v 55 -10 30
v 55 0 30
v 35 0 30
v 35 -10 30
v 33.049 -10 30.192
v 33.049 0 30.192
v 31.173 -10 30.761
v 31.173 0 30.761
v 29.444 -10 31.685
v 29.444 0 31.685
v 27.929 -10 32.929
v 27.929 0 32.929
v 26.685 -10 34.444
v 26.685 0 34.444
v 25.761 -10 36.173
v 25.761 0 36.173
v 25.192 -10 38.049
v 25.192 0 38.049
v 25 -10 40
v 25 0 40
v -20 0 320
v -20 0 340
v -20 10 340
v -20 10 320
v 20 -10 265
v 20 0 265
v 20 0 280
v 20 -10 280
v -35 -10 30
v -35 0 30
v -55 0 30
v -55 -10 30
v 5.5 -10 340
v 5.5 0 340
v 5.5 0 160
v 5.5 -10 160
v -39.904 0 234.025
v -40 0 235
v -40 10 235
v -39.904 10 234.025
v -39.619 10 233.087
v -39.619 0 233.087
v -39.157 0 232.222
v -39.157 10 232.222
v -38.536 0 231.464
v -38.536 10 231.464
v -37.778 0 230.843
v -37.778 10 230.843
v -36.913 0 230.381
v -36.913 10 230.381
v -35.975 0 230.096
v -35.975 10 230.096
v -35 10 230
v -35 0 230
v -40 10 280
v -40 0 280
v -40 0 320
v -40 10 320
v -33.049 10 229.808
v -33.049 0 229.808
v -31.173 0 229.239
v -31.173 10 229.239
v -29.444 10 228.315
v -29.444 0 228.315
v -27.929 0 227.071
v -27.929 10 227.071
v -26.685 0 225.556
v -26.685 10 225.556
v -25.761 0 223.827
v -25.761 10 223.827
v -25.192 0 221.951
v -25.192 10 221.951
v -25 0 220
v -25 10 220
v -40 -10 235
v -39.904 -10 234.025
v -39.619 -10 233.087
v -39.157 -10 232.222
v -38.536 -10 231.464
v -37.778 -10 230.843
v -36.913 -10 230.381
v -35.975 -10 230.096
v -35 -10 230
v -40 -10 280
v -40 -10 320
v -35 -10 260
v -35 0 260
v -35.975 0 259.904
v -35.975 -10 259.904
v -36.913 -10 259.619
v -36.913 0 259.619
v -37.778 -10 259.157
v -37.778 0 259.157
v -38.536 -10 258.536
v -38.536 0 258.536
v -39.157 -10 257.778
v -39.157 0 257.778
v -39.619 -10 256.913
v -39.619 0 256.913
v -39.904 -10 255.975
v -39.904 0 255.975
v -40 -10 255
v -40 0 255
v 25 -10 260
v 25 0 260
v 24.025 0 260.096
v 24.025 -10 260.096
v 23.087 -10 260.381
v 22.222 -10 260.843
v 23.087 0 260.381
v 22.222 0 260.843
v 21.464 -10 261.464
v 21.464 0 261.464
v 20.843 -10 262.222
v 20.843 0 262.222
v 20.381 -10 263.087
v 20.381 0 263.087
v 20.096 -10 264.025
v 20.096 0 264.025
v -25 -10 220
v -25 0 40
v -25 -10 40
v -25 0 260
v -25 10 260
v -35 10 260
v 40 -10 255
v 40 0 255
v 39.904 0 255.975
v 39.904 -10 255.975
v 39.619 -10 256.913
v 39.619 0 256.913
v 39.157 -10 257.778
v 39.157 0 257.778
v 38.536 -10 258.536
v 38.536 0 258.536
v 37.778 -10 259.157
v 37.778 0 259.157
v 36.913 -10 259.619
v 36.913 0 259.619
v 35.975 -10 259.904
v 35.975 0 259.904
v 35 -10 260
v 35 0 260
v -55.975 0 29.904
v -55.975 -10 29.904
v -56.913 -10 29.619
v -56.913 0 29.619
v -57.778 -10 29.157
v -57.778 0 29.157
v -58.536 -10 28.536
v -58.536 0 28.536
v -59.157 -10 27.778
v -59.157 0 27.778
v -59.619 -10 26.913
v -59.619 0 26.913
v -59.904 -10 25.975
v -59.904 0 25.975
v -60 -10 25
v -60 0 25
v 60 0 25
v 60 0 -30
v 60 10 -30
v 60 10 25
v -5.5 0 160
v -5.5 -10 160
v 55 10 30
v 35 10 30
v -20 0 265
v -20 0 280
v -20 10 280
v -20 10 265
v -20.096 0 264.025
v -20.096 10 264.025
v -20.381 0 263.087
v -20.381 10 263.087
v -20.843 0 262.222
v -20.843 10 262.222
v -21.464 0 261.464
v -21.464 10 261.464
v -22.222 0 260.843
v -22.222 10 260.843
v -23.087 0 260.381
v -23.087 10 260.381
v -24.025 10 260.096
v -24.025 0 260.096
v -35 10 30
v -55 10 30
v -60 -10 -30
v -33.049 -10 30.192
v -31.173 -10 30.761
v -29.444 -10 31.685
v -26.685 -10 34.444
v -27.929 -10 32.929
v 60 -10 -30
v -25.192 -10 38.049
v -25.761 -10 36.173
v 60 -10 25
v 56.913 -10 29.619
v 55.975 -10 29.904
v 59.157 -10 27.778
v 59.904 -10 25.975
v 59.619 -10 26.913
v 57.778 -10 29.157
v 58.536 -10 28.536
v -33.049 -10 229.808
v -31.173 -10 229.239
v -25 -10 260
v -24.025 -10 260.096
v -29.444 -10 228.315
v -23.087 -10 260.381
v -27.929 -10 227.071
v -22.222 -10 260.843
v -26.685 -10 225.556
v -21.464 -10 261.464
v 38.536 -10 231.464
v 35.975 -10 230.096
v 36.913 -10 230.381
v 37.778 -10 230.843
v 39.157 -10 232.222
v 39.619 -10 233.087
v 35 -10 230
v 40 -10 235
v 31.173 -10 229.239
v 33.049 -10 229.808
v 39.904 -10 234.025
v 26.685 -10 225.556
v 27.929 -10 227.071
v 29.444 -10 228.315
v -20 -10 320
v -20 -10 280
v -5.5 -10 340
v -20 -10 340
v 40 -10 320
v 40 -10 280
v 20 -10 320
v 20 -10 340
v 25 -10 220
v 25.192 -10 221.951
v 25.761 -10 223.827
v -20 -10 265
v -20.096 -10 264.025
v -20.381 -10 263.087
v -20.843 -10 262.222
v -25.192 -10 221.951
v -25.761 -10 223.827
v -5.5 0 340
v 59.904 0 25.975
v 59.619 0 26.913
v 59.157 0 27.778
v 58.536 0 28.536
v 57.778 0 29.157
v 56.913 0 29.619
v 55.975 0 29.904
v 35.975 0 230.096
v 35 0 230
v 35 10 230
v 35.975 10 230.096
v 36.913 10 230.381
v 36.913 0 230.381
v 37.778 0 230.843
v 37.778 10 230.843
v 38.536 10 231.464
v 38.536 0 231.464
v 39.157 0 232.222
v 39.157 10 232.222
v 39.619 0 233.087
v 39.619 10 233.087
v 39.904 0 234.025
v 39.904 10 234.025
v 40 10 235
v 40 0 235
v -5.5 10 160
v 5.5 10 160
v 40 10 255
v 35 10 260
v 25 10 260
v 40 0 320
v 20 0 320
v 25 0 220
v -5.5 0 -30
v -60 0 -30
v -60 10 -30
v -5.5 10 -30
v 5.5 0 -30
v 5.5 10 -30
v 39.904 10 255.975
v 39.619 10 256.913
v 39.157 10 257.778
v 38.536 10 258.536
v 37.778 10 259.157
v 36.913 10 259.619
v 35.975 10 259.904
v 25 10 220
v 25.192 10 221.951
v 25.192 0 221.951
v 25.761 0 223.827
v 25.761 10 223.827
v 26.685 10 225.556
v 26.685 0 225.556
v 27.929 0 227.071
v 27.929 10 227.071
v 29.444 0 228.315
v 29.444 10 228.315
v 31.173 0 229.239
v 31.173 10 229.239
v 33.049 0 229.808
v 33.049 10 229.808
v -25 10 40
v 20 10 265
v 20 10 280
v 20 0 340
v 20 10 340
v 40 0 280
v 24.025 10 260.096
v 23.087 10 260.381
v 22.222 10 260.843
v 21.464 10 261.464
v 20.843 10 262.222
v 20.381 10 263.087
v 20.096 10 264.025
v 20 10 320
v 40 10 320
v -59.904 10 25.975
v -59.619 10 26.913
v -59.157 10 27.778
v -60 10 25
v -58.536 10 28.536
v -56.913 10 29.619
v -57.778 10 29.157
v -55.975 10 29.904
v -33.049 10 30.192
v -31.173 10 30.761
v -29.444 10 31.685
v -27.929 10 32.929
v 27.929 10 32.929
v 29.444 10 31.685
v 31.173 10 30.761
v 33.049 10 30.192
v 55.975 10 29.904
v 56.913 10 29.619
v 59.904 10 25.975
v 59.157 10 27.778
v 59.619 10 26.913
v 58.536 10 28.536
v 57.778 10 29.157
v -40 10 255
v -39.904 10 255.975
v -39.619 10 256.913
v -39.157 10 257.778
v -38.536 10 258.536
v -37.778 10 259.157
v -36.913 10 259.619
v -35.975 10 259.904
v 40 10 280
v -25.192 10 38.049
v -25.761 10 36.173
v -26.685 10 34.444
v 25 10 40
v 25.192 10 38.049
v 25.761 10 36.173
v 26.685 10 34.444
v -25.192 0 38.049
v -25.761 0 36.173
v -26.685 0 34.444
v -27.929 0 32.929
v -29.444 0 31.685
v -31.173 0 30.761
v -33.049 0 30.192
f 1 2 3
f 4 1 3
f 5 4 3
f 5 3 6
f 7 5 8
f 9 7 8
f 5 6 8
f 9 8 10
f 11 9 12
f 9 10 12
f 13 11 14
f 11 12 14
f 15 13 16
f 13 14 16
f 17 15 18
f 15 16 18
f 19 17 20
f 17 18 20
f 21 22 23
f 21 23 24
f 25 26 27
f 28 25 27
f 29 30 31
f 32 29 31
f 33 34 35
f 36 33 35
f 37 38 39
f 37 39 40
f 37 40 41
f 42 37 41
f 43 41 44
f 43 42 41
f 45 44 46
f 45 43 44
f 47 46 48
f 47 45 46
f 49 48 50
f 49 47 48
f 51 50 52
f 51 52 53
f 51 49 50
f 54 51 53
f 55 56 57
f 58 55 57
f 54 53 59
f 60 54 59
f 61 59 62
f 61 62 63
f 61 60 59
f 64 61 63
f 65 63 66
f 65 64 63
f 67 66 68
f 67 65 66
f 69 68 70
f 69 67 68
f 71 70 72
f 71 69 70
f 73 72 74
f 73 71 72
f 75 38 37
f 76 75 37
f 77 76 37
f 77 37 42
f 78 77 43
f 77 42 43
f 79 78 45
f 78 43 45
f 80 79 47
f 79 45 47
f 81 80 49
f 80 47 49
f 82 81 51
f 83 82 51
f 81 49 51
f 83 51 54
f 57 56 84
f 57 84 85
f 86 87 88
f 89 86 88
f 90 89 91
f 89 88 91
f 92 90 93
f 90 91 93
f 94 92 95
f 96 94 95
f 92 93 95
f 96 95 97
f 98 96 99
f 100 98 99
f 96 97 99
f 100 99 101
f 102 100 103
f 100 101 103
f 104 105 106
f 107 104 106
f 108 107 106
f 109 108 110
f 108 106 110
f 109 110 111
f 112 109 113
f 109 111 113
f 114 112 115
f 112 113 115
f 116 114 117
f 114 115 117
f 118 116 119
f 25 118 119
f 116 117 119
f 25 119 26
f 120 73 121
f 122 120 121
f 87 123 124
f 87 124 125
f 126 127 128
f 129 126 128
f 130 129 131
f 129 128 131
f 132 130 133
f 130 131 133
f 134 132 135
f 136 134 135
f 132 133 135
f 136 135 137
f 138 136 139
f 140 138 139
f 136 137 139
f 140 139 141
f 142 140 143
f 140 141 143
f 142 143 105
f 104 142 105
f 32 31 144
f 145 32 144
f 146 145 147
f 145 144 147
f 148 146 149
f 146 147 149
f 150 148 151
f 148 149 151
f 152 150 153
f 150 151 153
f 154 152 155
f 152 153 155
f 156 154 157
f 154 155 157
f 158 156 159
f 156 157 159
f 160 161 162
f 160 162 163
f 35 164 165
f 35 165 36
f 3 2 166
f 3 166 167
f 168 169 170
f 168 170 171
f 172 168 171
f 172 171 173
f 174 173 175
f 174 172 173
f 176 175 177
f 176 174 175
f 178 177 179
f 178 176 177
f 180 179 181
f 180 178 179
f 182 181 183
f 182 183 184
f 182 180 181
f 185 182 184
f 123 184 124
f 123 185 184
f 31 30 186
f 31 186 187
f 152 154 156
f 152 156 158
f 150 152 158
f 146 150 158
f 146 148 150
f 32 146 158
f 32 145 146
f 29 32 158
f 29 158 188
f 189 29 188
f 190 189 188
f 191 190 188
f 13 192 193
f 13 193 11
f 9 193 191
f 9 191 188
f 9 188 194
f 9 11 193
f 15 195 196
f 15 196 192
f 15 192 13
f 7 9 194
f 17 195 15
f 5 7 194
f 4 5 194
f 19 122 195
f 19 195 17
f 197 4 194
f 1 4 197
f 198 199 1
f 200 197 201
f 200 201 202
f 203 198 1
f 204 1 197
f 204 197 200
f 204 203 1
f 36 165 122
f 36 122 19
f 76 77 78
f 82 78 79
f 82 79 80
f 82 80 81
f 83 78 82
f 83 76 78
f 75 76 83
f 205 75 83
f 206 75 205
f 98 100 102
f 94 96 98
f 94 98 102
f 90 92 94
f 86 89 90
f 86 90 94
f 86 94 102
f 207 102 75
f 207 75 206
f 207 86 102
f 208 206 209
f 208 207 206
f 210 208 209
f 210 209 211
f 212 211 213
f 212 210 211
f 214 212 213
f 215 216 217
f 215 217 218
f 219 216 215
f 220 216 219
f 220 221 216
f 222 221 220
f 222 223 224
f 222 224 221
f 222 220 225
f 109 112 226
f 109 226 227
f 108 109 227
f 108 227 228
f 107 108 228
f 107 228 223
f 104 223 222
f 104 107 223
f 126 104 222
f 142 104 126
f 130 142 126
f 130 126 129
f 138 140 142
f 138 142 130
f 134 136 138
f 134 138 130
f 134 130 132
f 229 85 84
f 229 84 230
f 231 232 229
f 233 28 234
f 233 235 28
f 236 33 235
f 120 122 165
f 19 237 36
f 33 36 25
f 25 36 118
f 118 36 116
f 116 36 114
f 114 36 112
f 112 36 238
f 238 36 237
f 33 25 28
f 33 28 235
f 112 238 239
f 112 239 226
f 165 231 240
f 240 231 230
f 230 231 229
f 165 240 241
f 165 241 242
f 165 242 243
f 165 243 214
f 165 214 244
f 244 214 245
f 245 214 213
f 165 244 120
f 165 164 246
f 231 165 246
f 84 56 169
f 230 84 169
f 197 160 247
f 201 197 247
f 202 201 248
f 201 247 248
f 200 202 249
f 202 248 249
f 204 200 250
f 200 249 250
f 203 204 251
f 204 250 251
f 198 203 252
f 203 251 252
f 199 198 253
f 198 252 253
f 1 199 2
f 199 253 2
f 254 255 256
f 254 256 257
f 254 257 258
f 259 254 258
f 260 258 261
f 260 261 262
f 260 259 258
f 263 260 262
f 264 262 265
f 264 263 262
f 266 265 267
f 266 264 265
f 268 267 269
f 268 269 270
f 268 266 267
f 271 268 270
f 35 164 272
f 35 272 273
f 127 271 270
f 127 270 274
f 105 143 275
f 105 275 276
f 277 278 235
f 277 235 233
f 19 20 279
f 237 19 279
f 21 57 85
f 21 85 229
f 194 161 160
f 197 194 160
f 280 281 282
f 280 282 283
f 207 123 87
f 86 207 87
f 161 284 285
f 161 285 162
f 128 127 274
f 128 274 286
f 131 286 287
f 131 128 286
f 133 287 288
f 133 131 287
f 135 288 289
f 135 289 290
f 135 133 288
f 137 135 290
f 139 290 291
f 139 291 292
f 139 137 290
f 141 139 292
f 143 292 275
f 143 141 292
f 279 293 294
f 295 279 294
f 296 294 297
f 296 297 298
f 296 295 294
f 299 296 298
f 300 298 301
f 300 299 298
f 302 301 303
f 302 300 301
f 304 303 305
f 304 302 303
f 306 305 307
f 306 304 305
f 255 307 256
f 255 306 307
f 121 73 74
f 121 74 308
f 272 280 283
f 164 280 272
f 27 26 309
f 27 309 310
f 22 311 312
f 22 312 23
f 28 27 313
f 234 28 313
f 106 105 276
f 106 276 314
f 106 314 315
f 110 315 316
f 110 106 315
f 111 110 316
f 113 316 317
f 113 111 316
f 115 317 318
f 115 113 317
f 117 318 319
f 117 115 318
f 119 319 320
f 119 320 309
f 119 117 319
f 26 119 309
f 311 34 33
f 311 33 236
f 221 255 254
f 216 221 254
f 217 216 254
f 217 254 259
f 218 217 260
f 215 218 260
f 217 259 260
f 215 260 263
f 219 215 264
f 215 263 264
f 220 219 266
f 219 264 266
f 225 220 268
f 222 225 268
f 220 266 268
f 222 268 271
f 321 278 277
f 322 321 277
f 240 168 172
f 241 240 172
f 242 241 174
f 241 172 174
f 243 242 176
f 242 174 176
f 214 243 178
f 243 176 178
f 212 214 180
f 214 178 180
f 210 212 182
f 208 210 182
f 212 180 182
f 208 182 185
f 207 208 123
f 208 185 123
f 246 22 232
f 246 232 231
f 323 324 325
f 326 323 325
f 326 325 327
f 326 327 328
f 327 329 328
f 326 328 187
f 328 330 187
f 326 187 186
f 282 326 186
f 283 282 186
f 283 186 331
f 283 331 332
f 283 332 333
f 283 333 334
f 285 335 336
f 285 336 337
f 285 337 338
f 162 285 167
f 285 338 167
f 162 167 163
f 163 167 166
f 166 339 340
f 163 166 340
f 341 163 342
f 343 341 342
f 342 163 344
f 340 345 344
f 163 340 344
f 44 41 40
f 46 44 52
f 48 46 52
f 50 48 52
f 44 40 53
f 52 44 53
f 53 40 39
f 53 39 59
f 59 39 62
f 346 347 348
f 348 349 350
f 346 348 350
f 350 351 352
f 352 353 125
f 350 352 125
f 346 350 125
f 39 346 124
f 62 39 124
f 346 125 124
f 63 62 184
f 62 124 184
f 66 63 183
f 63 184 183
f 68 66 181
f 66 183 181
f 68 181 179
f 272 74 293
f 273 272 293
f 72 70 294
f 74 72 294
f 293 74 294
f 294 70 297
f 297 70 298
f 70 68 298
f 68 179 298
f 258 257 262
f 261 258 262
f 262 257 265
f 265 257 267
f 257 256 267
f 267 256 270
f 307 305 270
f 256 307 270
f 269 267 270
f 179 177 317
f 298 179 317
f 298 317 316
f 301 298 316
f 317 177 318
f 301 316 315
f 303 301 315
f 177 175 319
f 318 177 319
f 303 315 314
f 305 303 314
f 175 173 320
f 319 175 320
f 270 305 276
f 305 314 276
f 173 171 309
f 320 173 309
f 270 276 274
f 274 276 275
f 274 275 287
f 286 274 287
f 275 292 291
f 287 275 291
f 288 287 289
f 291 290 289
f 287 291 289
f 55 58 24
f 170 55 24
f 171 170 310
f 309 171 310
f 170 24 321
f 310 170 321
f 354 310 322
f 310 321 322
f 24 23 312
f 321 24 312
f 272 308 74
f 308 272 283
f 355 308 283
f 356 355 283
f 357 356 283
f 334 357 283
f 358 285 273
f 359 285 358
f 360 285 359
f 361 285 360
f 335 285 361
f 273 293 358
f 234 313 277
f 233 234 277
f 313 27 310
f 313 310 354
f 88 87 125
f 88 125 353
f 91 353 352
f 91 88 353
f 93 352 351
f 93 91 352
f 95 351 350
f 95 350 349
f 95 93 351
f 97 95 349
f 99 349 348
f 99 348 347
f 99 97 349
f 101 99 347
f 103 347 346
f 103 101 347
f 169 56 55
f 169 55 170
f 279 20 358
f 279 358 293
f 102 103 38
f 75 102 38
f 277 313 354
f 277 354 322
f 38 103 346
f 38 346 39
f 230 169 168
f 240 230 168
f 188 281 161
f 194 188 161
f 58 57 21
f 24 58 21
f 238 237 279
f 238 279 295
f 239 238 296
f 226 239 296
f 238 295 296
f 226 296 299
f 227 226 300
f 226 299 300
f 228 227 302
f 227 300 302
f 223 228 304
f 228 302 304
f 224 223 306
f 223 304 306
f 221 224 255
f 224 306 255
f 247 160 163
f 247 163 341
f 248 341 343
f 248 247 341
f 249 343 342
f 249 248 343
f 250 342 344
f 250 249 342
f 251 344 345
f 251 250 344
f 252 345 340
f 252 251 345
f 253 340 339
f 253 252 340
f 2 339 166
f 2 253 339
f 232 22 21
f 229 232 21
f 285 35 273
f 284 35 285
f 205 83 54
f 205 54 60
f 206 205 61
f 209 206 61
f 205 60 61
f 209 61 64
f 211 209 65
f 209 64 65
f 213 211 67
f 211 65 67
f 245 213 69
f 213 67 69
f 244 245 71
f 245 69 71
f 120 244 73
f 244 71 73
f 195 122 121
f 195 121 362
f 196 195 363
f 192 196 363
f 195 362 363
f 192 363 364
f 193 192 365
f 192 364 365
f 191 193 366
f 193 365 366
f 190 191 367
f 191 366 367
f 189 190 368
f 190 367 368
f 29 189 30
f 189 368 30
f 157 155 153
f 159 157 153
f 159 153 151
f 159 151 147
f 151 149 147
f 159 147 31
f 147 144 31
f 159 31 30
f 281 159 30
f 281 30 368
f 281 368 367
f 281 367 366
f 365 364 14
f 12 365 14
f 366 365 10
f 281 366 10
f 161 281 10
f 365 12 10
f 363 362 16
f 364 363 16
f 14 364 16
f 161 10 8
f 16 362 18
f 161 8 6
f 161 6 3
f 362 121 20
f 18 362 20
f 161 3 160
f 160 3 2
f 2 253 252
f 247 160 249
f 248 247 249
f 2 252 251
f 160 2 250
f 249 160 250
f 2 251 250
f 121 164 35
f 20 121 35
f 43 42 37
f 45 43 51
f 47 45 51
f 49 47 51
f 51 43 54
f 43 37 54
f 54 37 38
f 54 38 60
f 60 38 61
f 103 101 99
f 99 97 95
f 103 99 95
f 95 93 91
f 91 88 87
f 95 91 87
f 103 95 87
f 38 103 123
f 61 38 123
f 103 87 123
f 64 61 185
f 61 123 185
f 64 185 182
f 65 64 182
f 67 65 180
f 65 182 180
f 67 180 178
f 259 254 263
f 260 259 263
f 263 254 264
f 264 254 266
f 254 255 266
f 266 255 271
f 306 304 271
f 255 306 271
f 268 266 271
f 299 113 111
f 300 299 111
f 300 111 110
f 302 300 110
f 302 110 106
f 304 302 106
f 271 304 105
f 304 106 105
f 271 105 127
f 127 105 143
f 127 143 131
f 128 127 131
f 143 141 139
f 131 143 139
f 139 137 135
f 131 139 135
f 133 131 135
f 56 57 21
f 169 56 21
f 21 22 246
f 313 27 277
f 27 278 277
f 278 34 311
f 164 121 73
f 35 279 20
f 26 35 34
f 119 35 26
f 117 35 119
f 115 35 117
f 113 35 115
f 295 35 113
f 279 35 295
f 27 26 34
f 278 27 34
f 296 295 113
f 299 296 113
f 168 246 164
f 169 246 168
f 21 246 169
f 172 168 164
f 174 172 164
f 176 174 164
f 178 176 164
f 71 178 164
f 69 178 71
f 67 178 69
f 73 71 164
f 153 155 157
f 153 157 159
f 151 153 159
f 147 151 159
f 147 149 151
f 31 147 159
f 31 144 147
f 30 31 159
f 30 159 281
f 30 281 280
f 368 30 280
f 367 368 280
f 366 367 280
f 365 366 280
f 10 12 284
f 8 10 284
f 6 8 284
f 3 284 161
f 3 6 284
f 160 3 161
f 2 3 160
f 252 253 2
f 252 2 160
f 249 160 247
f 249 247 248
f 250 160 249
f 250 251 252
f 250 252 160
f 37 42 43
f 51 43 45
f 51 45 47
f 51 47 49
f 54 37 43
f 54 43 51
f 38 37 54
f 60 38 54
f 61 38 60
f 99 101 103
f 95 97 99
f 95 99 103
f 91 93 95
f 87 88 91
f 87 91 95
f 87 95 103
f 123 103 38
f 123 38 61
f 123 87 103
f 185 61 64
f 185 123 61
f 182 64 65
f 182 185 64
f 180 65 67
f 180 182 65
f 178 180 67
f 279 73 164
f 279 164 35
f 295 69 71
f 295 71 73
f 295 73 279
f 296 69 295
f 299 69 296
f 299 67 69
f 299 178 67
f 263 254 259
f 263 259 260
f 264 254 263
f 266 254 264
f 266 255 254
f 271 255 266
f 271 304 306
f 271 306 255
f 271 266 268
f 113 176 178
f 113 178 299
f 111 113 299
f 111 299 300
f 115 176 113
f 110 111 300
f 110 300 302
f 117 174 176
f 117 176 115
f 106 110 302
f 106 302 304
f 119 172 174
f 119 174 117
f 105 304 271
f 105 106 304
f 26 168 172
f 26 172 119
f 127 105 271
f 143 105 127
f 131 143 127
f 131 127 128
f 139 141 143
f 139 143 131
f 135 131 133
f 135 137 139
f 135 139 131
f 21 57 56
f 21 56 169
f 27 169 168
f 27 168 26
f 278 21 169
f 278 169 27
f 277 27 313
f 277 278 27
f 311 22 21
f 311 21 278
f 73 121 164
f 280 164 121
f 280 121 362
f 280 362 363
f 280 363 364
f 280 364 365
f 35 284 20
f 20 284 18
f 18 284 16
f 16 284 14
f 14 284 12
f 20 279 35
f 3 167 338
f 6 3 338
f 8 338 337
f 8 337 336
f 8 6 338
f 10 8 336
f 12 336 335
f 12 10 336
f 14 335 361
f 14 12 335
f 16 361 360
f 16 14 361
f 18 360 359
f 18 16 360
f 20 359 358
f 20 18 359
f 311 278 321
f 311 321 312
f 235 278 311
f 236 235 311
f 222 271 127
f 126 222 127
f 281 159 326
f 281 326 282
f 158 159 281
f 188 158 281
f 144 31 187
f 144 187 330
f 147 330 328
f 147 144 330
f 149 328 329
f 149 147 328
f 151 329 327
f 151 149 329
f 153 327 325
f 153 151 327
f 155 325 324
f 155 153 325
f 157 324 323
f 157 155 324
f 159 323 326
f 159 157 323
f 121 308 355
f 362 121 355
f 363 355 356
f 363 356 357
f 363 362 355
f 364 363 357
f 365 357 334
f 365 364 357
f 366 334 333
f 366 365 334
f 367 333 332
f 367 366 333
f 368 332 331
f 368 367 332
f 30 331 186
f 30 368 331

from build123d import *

# Parameters (mm, degrees)
F0_W     = 14.5
F0_H     = 20
F0_W_2   = 11
F0_W_3   = 20
F0_H_2   = 40
F0_H_3   = 120
F1_DEPTH = 10
F0_H_4   = 190
F2_DEPTH = 10


with BuildPart() as f1:
    # F0 (on Front) → F1 (new body)
    with BuildSketch(Plane.XZ):
        with Locations((-12.75, 330)):
            Rectangle(F0_W, F0_H)
        with Locations((0, 330)):
            Rectangle(F0_W_2, F0_H)
        with Locations((12.75, 330)):
            Rectangle(F0_W, F0_H)
        with Locations((30, 300)):
            Rectangle(F0_W_3, F0_H_2)
        with Locations((12.75, 300)):
            Rectangle(F0_W, F0_H_2)
        with Locations((0, 300)):
            Rectangle(F0_W_2, F0_H_2)
        with Locations((-12.75, 300)):
            Rectangle(F0_W, F0_H_2)
        with Locations((-30, 300)):
            Rectangle(F0_W_3, F0_H_2)
        with BuildLine():
            Line((-60, -30), (-5.5, -30))
            Line((-5.5, -30), (-5.5, 160))
            Line((-5.5, 160), (-5.5, 280))
            Line((-5.5, 280), (-20, 280))
            Line((-20, 280), (-20, 265))
            ThreePointArc((-20, 265), (-21.4644660941, 261.4644660941), (-25, 260))
            Line((-25, 260), (-35, 260))
            ThreePointArc((-35, 260), (-38.5355339059, 258.5355339059), (-40, 255))
            Line((-40, 255), (-40, 235))
            ThreePointArc((-40, 235), (-38.5355339059, 231.4644660941), (-35, 230))
            ThreePointArc((-35, 230), (-27.9289321881, 227.0710678119), (-25, 220))
            Line((-25, 220), (-25, 40))
            ThreePointArc((-25, 40), (-27.9289321881, 32.9289321881), (-35, 30))
            Line((-35, 30), (-55, 30))
            ThreePointArc((-55, 30), (-58.5355339059, 28.5355339059), (-60, 25))
            Line((-60, 25), (-60, -30))
        make_face()
        with Locations((0, 220)):
            Rectangle(F0_W_2, F0_H_3)
        with BuildLine():
            Line((5.5, -30), (60, -30))
            Line((60, -30), (60, 25))
            ThreePointArc((60, 25), (58.5355339059, 28.5355339059), (55, 30))
            Line((55, 30), (35, 30))
            ThreePointArc((35, 30), (27.9289321881, 32.9289321881), (25, 40))
            Line((25, 40), (25, 220))
            ThreePointArc((25, 220), (27.9289321881, 227.0710678119), (35, 230))
            ThreePointArc((35, 230), (38.5355339059, 231.4644660941), (40, 235))
            Line((40, 235), (40, 255))
            ThreePointArc((40, 255), (38.5355339059, 258.5355339059), (35, 260))
            Line((35, 260), (25, 260))
            ThreePointArc((25, 260), (21.4644660941, 261.4644660941), (20, 265))
            Line((20, 265), (20, 280))
            Line((20, 280), (5.5, 280))
            Line((5.5, 280), (5.5, 160))
            Line((5.5, 160), (5.5, -30))
        make_face()
    extrude(amount=-F1_DEPTH)


with BuildPart() as f2:
    # F0 (on Front) → F2 (new body)
    with BuildSketch(Plane.XZ):
        with Locations((-12.75, 330)):
            Rectangle(F0_W, F0_H)
        with Locations((-12.75, 300)):
            Rectangle(F0_W, F0_H_2)
        with Locations((-30, 300)):
            Rectangle(F0_W_3, F0_H_2)
        with BuildLine():
            Line((-60, -30), (-5.5, -30))
            Line((-5.5, -30), (-5.5, 160))
            Line((-5.5, 160), (-5.5, 280))
            Line((-5.5, 280), (-20, 280))
            Line((-20, 280), (-20, 265))
            ThreePointArc((-20, 265), (-21.4644660941, 261.4644660941), (-25, 260))
            Line((-25, 260), (-35, 260))
            ThreePointArc((-35, 260), (-38.5355339059, 258.5355339059), (-40, 255))
            Line((-40, 255), (-40, 235))
            ThreePointArc((-40, 235), (-38.5355339059, 231.4644660941), (-35, 230))
            ThreePointArc((-35, 230), (-27.9289321881, 227.0710678119), (-25, 220))
            Line((-25, 220), (-25, 40))
            ThreePointArc((-25, 40), (-27.9289321881, 32.9289321881), (-35, 30))
            Line((-35, 30), (-55, 30))
            ThreePointArc((-55, 30), (-58.5355339059, 28.5355339059), (-60, 25))
            Line((-60, 25), (-60, -30))
        make_face()
        with Locations((0, 65)):
            Rectangle(F0_W_2, F0_H_4)
        with BuildLine():
            Line((5.5, -30), (60, -30))
            Line((60, -30), (60, 25))
            ThreePointArc((60, 25), (58.5355339059, 28.5355339059), (55, 30))
            Line((55, 30), (35, 30))
            ThreePointArc((35, 30), (27.9289321881, 32.9289321881), (25, 40))
            Line((25, 40), (25, 220))
            ThreePointArc((25, 220), (27.9289321881, 227.0710678119), (35, 230))
            ThreePointArc((35, 230), (38.5355339059, 231.4644660941), (40, 235))
            Line((40, 235), (40, 255))
            ThreePointArc((40, 255), (38.5355339059, 258.5355339059), (35, 260))
            Line((35, 260), (25, 260))
            ThreePointArc((25, 260), (21.4644660941, 261.4644660941), (20, 265))
            Line((20, 265), (20, 280))
            Line((20, 280), (5.5, 280))
            Line((5.5, 280), (5.5, 160))
            Line((5.5, 160), (5.5, -30))
        make_face()
        with Locations((12.75, 300)):
            Rectangle(F0_W, F0_H_2)
        with Locations((12.75, 330)):
            Rectangle(F0_W, F0_H)
        with Locations((30, 300)):
            Rectangle(F0_W_3, F0_H_2)
    extrude(amount=F2_DEPTH)


solid = Compound([f1.part, f2.part])
